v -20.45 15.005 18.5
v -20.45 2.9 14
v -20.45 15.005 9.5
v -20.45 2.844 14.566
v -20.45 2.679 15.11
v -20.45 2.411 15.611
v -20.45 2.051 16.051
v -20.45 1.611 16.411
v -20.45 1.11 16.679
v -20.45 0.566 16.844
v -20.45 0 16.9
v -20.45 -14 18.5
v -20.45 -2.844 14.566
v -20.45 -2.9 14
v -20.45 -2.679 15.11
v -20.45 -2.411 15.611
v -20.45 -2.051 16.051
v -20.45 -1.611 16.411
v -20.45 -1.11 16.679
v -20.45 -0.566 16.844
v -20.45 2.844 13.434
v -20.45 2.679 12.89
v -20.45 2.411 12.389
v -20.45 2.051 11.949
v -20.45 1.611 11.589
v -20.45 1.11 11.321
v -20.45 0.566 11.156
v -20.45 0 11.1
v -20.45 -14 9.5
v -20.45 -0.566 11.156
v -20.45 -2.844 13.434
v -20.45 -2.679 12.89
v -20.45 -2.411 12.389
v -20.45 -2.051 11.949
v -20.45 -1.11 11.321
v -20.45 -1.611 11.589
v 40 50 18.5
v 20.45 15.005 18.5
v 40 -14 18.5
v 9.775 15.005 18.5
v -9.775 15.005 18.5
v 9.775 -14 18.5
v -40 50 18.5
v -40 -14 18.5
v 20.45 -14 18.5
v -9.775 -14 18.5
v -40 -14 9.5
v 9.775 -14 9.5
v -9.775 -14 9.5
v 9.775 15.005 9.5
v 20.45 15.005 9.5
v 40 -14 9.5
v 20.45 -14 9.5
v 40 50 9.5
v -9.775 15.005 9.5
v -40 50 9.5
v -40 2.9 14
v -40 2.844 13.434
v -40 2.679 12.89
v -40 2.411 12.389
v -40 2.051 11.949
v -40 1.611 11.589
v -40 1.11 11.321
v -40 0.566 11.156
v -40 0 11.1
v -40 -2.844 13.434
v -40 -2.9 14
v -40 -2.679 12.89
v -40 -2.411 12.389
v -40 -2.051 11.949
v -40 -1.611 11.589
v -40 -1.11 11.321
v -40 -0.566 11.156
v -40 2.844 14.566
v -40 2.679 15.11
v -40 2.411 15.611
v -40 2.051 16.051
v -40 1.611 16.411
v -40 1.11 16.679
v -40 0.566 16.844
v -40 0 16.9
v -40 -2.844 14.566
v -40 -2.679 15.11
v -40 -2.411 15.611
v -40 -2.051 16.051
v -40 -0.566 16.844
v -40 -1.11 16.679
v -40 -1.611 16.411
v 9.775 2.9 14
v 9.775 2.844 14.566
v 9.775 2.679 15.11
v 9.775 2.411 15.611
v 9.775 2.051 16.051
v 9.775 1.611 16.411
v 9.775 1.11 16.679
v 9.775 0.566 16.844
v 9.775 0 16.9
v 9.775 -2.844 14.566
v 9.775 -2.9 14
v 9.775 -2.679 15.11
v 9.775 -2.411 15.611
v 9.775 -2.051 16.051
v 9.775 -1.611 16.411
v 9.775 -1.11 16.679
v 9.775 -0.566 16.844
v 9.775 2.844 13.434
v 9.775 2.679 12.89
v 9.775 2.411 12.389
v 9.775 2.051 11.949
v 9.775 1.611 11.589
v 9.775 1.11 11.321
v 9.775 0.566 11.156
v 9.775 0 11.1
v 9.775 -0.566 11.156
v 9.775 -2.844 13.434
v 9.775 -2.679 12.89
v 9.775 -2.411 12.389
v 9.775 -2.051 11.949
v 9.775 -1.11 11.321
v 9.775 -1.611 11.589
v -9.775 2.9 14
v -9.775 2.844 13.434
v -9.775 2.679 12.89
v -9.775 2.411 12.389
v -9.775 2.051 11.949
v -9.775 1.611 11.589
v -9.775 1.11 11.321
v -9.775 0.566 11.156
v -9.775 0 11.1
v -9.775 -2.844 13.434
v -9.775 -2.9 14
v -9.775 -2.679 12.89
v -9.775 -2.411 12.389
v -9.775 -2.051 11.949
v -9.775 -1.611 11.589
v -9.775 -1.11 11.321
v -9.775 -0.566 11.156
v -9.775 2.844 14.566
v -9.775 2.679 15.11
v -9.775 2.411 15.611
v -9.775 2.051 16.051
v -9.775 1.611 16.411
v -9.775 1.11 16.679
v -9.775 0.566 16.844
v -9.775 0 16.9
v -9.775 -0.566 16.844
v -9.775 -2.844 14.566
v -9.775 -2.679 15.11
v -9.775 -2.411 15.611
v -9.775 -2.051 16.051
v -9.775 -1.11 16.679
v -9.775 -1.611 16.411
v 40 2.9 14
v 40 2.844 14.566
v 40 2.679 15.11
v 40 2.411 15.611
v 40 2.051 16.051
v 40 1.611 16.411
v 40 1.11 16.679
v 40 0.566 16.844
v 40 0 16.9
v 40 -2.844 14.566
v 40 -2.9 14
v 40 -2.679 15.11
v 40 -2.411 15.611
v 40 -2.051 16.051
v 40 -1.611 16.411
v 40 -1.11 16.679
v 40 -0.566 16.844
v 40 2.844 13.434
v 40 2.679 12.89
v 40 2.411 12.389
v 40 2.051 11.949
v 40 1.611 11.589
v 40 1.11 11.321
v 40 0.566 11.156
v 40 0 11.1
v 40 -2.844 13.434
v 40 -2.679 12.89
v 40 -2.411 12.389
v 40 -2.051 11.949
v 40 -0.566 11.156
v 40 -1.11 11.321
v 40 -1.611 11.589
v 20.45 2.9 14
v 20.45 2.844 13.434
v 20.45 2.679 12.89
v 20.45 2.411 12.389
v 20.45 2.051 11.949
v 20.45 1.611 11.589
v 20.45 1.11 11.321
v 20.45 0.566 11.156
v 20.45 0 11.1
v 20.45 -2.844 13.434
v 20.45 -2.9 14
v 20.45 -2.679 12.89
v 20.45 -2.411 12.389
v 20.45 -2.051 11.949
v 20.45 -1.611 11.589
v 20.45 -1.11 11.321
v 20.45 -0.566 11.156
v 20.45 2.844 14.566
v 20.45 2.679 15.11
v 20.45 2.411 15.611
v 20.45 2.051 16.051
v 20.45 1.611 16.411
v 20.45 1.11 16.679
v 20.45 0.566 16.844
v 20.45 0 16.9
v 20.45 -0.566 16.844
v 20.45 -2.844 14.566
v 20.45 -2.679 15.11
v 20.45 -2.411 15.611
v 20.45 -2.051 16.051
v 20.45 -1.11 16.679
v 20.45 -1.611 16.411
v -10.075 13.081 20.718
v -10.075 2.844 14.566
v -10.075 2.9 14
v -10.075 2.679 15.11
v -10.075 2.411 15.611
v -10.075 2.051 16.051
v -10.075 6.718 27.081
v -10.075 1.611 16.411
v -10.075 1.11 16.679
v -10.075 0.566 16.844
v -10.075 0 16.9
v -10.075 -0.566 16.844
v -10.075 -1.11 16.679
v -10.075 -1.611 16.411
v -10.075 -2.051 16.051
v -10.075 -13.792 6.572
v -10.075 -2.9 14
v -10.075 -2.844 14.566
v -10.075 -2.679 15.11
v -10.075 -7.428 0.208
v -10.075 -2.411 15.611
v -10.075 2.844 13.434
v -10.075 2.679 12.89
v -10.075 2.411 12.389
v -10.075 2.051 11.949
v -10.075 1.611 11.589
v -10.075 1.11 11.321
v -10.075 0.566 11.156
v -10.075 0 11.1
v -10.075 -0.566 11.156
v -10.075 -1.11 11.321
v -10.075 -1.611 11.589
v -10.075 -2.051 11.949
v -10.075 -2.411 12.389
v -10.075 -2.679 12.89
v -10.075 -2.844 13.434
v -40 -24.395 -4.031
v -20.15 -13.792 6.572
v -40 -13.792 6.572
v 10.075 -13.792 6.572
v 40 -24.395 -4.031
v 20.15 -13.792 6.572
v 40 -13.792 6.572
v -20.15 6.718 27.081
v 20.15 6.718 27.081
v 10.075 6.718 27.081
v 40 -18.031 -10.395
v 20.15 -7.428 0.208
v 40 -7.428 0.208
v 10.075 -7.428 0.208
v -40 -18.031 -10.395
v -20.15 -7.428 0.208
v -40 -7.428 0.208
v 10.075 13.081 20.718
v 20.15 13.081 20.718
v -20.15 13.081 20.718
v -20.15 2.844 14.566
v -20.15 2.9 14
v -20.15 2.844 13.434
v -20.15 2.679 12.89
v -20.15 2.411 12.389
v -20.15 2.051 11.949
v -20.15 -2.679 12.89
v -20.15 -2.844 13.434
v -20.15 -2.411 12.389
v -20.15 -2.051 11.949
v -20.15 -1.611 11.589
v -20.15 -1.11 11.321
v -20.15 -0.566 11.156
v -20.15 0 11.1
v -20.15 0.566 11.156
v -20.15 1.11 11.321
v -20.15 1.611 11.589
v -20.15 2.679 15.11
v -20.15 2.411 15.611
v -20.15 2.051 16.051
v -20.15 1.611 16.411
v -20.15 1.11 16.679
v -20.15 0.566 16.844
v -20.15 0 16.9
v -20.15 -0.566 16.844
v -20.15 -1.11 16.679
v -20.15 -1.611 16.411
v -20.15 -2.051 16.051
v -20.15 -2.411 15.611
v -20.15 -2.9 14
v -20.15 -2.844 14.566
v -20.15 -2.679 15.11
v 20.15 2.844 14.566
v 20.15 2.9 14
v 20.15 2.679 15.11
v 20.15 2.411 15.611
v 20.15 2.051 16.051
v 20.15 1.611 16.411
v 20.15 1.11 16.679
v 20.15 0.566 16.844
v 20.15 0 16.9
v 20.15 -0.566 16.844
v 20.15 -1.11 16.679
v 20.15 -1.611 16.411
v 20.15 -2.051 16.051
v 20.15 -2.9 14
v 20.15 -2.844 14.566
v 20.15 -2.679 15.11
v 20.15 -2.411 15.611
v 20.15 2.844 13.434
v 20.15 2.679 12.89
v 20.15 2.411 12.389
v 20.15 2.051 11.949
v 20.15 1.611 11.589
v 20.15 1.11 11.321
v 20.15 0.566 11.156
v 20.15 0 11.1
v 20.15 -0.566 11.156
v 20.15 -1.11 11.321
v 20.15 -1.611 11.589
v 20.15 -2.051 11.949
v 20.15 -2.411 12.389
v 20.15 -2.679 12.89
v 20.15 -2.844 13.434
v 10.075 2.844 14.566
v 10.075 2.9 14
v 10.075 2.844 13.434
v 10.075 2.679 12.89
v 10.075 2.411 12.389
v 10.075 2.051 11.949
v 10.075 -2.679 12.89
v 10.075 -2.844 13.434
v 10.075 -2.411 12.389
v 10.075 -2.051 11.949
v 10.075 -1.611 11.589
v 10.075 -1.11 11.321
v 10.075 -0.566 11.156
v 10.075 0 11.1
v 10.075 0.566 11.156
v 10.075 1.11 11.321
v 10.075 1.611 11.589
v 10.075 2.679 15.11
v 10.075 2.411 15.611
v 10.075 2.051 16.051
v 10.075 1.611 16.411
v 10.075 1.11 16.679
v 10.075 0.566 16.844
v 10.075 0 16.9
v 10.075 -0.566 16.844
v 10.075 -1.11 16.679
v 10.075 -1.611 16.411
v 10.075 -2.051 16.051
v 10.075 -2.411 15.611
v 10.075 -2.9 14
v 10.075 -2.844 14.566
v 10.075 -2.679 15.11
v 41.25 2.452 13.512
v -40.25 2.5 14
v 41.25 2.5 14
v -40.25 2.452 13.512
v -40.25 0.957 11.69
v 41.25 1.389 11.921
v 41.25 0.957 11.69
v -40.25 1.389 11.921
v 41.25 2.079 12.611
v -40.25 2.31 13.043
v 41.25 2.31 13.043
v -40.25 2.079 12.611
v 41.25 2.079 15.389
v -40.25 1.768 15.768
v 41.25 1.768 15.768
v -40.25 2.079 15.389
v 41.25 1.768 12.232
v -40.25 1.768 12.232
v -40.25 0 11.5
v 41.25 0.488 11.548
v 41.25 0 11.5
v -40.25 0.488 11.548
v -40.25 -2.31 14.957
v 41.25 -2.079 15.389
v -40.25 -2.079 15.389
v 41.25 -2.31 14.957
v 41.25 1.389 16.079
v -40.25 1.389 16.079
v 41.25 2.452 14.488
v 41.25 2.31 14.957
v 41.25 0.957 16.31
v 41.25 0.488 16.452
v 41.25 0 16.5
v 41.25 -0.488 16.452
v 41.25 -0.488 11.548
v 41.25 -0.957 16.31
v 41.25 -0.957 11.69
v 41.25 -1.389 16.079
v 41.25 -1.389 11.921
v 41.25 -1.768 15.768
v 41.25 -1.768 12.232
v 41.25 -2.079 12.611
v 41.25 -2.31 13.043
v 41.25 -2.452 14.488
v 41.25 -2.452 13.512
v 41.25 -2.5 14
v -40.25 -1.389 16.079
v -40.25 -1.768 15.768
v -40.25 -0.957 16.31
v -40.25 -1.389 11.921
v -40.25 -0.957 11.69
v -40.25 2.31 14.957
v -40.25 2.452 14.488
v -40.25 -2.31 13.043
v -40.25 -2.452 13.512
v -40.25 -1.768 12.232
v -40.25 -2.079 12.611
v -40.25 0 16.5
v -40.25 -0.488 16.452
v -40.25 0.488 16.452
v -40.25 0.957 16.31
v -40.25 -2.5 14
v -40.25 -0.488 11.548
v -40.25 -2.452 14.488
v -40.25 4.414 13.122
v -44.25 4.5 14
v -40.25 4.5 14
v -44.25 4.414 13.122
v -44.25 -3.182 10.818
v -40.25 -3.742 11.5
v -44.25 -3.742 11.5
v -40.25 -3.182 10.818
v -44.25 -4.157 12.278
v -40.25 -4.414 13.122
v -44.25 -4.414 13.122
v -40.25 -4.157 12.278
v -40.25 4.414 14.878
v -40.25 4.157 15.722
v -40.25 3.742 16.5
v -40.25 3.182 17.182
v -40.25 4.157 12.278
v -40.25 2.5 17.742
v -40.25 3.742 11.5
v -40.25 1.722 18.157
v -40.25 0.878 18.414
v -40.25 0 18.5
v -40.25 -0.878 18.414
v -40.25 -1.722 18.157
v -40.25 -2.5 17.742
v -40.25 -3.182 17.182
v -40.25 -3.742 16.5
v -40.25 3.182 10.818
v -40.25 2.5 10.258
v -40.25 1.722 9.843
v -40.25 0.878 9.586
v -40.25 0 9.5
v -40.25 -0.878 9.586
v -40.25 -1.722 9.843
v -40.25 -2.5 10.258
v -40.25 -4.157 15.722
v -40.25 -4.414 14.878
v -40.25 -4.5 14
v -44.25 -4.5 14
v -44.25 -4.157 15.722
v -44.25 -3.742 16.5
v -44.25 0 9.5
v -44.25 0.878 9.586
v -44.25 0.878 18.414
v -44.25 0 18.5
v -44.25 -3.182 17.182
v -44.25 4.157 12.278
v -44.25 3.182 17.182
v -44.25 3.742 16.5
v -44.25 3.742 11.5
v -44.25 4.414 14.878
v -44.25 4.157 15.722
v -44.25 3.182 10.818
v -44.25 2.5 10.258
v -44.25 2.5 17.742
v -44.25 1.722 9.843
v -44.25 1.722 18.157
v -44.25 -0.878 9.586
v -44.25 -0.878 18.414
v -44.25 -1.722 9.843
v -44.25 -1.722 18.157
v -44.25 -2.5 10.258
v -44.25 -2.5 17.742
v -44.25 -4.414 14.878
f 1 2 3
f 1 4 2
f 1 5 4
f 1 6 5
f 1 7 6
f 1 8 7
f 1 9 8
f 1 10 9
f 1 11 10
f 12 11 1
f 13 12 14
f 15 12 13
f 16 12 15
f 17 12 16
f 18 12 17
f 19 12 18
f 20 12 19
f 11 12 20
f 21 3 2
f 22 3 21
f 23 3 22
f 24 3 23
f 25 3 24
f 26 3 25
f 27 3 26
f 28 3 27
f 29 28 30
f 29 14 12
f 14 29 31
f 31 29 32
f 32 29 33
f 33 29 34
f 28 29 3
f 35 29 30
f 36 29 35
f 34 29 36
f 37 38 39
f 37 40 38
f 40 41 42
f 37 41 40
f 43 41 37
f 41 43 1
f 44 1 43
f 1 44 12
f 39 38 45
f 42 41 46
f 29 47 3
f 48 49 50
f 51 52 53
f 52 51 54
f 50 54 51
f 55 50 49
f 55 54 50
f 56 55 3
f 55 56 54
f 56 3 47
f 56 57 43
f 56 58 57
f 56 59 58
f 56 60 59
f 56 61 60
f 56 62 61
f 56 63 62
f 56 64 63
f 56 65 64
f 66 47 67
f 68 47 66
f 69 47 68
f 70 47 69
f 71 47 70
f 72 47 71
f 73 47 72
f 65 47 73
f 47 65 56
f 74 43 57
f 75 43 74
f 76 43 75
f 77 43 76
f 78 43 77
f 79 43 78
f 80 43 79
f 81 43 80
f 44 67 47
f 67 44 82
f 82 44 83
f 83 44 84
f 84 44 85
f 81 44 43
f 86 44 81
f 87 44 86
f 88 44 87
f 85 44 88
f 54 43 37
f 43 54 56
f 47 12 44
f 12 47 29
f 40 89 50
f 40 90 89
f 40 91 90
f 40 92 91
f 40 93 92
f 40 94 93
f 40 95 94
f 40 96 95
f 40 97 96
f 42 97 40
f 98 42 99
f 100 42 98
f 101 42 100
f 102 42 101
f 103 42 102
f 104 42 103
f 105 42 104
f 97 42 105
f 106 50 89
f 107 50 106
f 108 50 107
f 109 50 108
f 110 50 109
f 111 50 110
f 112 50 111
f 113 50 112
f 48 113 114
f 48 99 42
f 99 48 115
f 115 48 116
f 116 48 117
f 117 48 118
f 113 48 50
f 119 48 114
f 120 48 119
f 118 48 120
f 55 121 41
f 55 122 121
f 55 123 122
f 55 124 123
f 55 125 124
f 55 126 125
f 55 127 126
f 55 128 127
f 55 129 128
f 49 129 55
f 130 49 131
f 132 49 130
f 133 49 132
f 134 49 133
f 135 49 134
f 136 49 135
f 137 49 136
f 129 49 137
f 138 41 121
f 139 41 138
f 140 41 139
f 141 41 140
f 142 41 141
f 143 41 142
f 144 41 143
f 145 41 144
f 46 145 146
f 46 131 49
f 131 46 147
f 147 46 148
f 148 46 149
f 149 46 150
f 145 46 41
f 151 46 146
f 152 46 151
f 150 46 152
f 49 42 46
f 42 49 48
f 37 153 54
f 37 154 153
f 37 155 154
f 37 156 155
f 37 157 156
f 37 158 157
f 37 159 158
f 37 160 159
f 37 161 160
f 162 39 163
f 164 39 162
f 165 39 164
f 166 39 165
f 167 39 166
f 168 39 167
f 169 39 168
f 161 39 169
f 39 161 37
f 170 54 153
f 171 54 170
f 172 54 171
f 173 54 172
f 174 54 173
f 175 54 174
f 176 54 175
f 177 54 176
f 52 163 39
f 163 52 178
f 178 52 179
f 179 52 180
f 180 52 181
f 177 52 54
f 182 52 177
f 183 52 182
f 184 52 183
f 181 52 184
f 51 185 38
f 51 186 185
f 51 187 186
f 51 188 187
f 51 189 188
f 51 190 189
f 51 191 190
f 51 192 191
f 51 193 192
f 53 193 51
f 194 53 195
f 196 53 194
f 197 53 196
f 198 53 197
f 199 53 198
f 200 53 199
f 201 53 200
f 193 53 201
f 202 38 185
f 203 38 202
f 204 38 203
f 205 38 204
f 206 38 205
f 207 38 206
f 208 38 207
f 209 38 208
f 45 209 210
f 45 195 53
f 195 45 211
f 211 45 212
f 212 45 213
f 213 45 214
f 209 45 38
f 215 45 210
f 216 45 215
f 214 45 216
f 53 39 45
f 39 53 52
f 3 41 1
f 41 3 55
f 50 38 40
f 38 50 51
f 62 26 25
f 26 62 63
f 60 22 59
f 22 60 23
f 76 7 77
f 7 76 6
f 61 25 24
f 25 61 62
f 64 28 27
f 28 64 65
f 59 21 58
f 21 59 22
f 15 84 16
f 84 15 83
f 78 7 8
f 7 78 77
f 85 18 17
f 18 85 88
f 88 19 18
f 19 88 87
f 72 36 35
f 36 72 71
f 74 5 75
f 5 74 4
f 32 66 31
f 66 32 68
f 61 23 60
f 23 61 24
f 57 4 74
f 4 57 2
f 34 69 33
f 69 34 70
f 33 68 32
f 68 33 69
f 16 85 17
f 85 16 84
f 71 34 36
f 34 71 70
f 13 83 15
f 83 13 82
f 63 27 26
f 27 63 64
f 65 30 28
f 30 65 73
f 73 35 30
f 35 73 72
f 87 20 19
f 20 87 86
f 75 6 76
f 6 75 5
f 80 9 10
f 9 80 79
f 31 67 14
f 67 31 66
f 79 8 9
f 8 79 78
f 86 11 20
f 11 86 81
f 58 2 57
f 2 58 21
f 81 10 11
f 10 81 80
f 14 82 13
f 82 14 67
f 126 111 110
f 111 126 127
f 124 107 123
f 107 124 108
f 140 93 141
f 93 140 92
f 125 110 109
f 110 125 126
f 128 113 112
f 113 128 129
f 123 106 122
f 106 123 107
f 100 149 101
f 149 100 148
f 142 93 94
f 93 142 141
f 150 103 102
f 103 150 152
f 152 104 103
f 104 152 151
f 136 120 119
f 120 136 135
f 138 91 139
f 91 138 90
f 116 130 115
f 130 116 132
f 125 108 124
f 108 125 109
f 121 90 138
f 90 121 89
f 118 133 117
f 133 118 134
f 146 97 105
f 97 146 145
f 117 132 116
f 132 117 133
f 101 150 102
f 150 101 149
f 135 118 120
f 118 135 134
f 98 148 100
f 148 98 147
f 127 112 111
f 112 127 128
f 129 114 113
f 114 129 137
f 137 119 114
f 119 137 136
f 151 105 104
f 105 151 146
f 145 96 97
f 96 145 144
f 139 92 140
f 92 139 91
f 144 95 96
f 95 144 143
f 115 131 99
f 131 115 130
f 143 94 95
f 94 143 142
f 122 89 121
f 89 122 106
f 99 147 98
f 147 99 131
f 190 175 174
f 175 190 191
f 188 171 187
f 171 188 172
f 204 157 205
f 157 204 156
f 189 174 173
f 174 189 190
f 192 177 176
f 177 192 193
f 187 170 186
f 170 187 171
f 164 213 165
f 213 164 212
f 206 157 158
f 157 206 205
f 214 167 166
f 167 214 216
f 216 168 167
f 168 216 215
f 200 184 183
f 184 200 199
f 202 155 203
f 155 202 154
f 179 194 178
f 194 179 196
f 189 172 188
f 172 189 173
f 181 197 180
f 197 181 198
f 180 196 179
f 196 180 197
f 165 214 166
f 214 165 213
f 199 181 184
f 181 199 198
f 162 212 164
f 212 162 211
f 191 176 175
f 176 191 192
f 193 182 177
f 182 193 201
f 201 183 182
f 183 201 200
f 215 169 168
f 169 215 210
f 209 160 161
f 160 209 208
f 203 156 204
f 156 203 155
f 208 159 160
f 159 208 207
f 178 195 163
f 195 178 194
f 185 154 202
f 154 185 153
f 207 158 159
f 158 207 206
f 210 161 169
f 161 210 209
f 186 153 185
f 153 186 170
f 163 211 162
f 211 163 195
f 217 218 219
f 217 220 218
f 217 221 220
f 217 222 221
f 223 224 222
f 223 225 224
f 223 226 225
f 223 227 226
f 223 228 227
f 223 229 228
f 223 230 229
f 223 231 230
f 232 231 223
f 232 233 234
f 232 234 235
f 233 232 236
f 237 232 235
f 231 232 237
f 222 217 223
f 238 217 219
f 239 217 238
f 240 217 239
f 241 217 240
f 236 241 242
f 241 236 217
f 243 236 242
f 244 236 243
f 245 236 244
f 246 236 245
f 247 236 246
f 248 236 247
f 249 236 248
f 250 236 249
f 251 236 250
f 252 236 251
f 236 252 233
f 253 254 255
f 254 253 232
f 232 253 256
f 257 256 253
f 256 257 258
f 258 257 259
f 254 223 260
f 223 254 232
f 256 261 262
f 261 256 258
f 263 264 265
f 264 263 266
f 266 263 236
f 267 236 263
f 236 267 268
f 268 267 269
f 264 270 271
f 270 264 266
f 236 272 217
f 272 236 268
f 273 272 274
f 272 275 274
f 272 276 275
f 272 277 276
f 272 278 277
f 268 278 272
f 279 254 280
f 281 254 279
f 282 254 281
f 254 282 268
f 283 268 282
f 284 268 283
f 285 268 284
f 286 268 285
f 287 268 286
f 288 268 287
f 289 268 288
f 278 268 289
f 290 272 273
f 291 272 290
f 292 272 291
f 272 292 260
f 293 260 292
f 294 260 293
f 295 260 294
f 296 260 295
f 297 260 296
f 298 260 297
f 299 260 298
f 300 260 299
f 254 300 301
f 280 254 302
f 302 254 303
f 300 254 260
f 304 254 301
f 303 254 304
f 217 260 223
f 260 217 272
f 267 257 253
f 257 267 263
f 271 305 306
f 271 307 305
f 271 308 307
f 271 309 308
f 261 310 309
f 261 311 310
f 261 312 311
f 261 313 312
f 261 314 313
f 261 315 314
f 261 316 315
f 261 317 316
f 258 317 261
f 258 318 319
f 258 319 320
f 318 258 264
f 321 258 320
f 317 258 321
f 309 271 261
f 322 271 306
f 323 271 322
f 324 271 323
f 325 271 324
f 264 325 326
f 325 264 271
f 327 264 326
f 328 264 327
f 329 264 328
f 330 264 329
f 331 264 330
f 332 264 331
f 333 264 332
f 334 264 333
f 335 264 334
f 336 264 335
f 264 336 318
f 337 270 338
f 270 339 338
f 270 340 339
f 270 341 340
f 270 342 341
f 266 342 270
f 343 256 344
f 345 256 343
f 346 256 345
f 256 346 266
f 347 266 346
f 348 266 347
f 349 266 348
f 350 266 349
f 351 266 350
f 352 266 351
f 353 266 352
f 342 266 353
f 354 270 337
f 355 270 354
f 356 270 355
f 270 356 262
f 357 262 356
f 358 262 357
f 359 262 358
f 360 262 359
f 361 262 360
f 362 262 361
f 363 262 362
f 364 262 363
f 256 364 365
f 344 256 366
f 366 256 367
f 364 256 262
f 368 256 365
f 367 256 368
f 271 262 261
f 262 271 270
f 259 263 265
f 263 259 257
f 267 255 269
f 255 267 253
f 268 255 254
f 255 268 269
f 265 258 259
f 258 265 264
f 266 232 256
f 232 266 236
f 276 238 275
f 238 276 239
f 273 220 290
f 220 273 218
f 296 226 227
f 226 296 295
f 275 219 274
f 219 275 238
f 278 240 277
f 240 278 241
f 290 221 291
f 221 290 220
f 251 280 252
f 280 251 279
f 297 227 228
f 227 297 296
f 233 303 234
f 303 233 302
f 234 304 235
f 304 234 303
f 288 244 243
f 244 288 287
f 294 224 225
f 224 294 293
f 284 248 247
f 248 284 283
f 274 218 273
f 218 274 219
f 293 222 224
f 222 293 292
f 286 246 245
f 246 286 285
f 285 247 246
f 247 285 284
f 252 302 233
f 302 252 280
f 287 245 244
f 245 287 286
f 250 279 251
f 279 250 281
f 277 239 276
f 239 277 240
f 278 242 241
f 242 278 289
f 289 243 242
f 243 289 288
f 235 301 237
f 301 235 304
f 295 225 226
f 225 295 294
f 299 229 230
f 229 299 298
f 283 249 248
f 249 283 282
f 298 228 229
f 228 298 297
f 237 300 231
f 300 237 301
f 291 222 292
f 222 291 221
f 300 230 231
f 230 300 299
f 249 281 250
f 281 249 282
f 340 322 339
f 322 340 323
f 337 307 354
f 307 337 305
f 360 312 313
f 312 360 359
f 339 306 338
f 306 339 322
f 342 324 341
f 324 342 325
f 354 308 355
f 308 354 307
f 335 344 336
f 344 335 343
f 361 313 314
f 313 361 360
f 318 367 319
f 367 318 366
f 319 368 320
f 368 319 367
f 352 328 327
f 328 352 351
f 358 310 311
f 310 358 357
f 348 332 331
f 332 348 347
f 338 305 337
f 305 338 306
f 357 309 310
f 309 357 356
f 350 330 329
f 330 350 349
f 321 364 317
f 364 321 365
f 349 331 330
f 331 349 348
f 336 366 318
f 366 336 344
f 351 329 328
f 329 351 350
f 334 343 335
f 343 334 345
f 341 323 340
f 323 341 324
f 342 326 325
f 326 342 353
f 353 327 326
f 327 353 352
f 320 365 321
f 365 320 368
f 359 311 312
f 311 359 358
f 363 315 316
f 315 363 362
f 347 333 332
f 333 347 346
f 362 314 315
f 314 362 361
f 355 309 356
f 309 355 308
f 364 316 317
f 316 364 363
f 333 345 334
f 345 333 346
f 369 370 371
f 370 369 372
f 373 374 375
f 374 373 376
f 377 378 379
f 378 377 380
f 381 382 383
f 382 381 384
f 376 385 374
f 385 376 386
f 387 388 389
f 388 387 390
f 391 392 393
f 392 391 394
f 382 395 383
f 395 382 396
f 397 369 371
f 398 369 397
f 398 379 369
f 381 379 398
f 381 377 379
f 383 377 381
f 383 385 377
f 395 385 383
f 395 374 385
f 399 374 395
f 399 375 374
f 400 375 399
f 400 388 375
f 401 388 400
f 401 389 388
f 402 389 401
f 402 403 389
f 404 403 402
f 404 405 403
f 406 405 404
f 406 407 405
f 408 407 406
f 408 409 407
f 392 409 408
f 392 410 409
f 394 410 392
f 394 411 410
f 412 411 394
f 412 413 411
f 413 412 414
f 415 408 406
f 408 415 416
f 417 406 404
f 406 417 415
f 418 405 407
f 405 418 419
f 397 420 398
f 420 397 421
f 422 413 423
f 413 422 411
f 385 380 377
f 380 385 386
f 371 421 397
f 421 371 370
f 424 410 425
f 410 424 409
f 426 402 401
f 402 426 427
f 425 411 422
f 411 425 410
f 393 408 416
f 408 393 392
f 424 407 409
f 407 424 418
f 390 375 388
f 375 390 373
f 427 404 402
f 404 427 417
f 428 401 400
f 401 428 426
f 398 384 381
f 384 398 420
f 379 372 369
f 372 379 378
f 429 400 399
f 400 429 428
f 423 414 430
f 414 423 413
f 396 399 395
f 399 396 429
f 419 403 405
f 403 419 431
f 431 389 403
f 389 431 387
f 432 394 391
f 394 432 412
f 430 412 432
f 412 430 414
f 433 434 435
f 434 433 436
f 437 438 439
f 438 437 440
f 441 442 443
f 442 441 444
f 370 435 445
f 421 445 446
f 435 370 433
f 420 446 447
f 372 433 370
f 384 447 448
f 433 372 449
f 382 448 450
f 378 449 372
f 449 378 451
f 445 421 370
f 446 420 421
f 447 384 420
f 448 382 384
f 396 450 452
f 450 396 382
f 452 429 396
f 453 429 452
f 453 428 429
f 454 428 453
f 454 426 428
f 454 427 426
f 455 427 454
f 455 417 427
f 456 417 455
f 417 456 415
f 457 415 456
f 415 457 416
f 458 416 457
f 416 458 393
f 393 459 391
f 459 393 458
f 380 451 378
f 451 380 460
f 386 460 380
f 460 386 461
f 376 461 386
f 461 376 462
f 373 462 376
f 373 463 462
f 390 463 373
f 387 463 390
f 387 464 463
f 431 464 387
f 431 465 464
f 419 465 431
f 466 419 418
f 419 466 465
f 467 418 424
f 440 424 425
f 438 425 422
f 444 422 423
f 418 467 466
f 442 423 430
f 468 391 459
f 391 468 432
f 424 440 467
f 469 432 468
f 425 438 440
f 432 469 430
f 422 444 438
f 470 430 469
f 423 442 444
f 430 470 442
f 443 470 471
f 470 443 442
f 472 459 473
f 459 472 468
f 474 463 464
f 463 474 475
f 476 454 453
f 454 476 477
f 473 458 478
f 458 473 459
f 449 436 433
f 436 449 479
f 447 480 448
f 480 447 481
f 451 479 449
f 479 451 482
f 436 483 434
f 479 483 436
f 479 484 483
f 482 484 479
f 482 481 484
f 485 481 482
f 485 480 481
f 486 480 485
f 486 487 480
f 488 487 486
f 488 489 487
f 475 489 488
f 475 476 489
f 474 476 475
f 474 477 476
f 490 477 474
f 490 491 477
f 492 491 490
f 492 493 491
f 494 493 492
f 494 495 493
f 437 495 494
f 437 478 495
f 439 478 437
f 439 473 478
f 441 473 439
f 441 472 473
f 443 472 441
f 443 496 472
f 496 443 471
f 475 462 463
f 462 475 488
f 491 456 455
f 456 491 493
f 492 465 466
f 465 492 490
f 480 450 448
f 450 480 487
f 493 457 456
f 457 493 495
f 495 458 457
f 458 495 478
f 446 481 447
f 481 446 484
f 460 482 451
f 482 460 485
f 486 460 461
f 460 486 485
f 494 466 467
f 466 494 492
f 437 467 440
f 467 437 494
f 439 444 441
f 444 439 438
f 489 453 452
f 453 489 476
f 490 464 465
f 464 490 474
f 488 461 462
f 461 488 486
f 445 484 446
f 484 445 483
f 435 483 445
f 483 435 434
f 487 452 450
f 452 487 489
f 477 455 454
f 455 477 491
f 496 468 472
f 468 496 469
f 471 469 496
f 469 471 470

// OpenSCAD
$fn = 32;

// ------------------------------------------------------------------------
// Butt hinge: hinge 80 mm, leaf swung 45 deg
// Every part is its own module, assembly() places every instance.
// ------------------------------------------------------------------------

// --- part 1 ---
module hinge_base() {
  difference() {
    union() {
      translate([-40, -14, -4.5]) cube([19.55, 64, 9]);
      translate([-9.775, -14, -4.5]) cube([19.55, 64, 9]);
      translate([20.45, -14, -4.5]) cube([19.55, 64, 9]);
      translate([-40, 15.005, -4.5]) cube([80, 34.995, 9]);
    }
    translate([-30.225, 0, 0]) rotate([0, 90, 0]) cylinder(h = 21.55, d = 5.8, center = true);
    translate([0, 0, 0]) rotate([0, 90, 0]) cylinder(h = 21.55, d = 5.8, center = true);
    translate([30.225, 0, 0]) rotate([0, 90, 0]) cylinder(h = 21.55, d = 5.8, center = true);
  }
}

// --- part 2 ---
module hinge_mover() {
  difference() {
    union() {
      translate([-20.15, -30, -4.5]) cube([10.075, 44, 9]);
      translate([10.075, -30, -4.5]) cube([10.075, 44, 9]);
      translate([-40, -30, -4.5]) cube([80, 14.995, 9]);
    }
    translate([-15.113, 0, 0]) rotate([0, 90, 0]) cylinder(h = 12.075, d = 5.8, center = true);
    translate([15.113, 0, 0]) rotate([0, 90, 0]) cylinder(h = 12.075, d = 5.8, center = true);
  }
}

// --- part 3 ---
module hinge_pin() {
  rotate([0, 90, 0]) cylinder(h = 82.5, d = 5, center = true);
  translate([-44.25, 0, 0]) rotate([0, 90, 0]) cylinder(h = 4, d = 9);
}

// --- assembly ---
module assembly() {
  color([0.80, 0.24, 0.20]) translate([0, 0, 14]) rotate([0, 0, 0]) hinge_base();
  color([0.20, 0.45, 0.75]) translate([0, 0, 14]) rotate([45, 0, 0]) hinge_mover();
  color([0.25, 0.62, 0.32]) translate([0, 0, 14]) rotate([0, 0, 0]) hinge_pin();
}

assembly();
